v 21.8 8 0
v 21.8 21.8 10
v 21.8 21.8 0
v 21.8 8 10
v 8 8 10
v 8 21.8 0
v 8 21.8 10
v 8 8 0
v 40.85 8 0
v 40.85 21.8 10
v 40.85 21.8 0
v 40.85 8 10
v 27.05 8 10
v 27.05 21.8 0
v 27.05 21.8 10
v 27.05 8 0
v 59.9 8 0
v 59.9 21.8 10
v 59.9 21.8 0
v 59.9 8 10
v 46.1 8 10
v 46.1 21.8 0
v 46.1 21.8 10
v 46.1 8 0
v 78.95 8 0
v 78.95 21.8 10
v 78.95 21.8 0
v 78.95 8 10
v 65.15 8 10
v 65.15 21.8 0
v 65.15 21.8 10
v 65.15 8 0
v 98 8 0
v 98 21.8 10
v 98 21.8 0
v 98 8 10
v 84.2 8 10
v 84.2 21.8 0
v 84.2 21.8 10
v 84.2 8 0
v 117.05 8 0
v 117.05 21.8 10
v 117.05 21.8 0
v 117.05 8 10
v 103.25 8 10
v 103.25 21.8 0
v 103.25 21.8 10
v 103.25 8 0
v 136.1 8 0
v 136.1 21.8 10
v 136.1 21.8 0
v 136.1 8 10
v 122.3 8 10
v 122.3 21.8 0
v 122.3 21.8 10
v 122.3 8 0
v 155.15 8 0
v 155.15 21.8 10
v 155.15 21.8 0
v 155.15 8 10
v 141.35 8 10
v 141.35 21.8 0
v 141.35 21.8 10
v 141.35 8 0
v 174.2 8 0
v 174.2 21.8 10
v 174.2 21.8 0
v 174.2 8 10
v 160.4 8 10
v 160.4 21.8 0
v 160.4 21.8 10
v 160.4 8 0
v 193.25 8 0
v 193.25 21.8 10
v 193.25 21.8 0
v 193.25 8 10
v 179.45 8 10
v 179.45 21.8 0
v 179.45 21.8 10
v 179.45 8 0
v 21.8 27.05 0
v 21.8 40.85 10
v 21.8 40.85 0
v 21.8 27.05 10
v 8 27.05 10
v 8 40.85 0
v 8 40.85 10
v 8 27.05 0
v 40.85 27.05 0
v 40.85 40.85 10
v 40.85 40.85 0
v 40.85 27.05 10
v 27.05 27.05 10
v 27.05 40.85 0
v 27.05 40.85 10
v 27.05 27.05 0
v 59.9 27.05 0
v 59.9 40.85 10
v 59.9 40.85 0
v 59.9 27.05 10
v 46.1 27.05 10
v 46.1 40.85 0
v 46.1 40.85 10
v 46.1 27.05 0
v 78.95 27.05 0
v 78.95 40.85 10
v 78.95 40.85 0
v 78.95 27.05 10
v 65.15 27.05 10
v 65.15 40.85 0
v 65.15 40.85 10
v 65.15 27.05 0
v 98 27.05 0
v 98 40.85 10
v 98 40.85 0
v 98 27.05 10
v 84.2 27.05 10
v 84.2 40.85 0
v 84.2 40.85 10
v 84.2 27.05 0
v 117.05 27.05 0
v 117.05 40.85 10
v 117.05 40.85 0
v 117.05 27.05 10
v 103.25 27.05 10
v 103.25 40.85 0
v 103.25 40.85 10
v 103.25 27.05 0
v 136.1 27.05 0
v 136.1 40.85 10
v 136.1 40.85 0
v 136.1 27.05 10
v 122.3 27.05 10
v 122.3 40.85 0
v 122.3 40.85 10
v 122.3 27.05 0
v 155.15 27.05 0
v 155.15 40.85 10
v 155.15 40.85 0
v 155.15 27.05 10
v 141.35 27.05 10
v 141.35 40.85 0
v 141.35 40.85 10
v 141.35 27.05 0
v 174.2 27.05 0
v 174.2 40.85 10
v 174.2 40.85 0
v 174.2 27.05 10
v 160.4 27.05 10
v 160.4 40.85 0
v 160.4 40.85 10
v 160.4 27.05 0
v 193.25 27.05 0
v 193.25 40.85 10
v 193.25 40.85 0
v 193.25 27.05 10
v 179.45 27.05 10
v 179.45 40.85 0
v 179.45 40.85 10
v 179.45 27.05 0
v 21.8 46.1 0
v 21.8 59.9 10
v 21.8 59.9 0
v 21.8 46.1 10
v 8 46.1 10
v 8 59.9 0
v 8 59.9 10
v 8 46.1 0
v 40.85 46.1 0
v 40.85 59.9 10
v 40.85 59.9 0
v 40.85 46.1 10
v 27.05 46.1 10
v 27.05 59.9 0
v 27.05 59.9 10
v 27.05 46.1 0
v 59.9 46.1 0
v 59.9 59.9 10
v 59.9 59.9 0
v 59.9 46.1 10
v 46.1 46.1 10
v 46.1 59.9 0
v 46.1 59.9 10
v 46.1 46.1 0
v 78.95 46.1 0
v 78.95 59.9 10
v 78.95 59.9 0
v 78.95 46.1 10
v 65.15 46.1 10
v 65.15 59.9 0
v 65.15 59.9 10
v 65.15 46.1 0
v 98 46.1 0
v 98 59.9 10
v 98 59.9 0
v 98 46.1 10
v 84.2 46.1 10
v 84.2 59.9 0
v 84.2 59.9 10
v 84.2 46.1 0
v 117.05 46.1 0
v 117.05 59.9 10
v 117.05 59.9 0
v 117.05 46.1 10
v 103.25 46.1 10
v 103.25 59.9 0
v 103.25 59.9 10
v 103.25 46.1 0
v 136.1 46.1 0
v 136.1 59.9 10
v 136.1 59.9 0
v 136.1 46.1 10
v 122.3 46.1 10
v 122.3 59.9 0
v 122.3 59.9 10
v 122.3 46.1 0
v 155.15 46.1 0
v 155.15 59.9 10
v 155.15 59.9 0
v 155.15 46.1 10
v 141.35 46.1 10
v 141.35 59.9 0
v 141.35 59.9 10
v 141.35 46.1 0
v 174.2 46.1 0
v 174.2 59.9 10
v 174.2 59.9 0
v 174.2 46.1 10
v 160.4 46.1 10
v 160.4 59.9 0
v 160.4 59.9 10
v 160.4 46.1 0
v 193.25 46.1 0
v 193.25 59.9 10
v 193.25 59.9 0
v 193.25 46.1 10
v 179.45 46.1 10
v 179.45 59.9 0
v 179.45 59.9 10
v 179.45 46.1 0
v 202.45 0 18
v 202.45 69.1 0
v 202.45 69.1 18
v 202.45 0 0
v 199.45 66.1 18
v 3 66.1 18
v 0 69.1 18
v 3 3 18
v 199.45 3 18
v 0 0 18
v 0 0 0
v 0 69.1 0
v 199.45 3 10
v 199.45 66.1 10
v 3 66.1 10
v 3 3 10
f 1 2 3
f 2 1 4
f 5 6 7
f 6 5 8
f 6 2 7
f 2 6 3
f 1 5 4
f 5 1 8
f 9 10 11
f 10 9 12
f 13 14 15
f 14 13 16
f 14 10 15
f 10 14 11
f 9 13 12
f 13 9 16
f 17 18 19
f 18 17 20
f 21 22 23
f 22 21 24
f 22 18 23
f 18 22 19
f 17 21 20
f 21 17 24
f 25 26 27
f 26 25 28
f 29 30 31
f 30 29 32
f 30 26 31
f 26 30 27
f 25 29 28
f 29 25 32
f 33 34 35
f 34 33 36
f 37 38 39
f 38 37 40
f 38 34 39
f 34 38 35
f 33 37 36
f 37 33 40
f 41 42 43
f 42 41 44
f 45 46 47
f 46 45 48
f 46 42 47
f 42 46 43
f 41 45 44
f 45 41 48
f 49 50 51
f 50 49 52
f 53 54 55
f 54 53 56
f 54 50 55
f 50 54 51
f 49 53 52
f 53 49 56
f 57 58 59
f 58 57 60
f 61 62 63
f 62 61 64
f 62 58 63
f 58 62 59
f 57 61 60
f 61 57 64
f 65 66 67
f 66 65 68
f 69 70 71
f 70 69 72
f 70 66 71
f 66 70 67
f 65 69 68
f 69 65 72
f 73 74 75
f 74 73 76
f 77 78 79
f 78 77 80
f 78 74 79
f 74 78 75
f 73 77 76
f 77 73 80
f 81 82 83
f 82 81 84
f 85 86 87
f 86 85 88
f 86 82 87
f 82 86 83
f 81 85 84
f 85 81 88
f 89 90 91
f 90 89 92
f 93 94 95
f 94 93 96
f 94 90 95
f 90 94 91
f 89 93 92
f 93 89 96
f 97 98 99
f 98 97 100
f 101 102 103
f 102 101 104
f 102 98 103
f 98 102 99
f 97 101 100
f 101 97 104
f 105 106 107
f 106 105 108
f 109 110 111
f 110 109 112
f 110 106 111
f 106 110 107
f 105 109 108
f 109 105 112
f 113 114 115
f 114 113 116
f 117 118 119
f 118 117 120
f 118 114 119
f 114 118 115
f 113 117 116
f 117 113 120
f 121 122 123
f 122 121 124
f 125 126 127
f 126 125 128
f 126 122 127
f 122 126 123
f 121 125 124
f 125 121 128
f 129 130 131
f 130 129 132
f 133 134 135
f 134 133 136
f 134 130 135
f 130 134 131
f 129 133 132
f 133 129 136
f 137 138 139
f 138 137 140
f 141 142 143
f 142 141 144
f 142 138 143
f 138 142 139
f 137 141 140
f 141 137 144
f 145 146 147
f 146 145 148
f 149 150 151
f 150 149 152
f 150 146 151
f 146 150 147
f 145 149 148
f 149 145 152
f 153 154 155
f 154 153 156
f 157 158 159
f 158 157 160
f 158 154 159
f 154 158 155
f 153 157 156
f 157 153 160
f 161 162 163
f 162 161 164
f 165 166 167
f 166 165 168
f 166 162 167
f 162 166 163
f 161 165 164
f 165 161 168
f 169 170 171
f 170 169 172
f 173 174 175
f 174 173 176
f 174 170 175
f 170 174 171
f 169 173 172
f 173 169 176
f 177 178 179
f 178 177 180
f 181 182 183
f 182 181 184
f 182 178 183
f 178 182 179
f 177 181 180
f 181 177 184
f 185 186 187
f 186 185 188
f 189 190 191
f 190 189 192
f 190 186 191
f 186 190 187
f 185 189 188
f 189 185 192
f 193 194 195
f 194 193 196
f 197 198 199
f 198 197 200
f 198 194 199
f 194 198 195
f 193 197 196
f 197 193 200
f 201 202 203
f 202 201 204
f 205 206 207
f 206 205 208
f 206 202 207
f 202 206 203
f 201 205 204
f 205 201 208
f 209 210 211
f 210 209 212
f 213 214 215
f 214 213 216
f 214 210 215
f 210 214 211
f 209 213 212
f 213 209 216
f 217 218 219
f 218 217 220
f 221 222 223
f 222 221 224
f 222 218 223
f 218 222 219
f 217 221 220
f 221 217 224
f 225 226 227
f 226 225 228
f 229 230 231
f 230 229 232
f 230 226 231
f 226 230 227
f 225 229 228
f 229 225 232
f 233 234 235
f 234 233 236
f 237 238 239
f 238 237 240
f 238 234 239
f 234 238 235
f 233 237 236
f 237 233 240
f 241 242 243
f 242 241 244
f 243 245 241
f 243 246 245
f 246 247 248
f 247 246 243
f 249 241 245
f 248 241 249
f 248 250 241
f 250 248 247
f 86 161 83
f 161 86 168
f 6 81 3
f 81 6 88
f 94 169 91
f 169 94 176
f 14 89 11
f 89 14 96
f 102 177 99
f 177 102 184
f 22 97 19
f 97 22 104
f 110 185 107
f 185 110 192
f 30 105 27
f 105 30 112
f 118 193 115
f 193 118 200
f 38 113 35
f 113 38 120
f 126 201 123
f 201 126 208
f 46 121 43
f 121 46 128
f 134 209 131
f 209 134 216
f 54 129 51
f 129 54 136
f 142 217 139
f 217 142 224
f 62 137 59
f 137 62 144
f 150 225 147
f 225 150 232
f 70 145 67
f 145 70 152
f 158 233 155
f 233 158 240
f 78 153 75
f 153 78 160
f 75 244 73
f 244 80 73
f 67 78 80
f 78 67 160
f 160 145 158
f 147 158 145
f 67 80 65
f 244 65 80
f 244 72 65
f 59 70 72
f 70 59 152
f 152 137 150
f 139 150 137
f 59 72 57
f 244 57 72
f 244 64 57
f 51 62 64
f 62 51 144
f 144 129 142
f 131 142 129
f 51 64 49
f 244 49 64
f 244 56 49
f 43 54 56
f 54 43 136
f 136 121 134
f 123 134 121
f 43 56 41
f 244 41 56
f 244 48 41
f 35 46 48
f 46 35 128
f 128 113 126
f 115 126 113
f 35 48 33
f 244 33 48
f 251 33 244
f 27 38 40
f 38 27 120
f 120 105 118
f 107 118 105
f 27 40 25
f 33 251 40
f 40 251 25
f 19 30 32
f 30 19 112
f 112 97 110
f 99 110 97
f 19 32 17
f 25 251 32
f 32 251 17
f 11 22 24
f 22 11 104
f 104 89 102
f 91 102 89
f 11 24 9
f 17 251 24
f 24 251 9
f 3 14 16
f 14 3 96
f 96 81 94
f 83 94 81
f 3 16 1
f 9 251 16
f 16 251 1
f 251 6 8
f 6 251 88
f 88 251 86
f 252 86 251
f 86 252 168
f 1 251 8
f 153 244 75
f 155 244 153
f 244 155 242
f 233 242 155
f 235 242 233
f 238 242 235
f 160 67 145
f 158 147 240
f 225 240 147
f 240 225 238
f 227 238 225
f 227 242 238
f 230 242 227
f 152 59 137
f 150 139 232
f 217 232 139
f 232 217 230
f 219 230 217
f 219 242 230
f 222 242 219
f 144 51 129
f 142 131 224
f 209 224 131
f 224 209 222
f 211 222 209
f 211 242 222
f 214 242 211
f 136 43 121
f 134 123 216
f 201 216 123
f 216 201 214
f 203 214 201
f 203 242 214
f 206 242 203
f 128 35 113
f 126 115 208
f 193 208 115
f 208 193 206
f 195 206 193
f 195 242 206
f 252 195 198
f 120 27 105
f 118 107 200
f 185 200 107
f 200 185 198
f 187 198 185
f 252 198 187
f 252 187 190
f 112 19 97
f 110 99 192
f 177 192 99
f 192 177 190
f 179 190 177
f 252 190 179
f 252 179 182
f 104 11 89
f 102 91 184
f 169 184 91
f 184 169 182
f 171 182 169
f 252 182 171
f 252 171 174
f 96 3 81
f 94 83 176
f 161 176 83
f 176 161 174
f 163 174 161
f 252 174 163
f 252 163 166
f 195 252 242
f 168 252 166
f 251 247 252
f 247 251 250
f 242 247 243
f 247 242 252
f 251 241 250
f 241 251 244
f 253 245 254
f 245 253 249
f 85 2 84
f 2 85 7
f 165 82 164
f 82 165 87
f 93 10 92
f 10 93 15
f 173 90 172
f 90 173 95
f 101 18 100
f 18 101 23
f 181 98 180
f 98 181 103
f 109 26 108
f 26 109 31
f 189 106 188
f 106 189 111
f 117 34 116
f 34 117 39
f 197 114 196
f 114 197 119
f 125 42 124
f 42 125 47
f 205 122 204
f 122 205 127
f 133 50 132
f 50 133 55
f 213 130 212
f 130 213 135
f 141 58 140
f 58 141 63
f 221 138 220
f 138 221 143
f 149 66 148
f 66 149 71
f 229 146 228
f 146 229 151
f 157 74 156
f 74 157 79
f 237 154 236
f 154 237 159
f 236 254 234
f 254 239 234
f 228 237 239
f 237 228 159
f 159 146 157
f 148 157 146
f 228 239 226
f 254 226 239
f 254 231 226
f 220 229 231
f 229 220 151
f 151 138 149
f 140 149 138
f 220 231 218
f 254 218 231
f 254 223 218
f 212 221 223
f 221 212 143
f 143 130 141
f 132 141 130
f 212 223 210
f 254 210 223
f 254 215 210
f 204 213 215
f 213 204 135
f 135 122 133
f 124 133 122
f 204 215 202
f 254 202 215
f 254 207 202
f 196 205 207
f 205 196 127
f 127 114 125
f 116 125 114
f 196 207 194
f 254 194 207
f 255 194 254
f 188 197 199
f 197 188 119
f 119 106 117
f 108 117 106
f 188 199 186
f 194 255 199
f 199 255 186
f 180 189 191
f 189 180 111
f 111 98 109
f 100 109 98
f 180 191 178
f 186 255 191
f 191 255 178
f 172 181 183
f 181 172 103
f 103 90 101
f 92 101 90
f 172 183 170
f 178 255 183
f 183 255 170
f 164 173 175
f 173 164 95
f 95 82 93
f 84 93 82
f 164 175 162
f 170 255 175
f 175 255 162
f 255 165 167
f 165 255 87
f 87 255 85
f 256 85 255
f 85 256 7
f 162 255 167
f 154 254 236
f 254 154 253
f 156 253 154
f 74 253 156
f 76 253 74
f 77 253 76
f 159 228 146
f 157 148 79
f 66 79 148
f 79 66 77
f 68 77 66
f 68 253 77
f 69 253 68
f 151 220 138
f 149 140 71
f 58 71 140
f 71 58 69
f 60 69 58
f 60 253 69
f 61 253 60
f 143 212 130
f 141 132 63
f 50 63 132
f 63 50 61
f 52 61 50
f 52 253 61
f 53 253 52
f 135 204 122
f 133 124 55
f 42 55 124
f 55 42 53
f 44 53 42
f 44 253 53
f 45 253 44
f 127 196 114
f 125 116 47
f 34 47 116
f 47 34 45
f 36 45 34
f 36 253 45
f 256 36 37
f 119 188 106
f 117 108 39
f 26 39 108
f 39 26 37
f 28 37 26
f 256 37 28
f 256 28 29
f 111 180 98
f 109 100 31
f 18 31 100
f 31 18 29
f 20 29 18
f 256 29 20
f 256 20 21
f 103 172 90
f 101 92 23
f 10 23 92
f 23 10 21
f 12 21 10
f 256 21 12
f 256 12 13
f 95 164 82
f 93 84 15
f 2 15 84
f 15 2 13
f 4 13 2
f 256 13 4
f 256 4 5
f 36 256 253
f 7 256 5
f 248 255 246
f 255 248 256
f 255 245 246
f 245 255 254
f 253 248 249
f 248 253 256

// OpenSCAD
// Generated keyboard case
// Layout: 3x10
// Switch type: Kailh Choc

// Parameters
case_width = 202.45;
case_height = 69.10;
case_depth = 18.00;
wall_thickness = 3.00;
base_height = 10.00;
switch_cutout_size = 13.80;
key_spacing = 19.05;

module keyboard_case() {
    difference() {
        // Outer shell
        translate([0, 0, 0])
            cube([case_width, case_height, case_depth]);

        // Inner cavity
        translate([wall_thickness, wall_thickness, base_height])
            cube([case_width - 2*wall_thickness, 
                  case_height - 2*wall_thickness, 
                  case_depth - base_height + 1]);

        // Switch cutouts
        translate([wall_thickness + 5 - 0.00, wall_thickness + 5 - 0.00, -1])
            switch_plate();
    }
}

module switch_plate() {
    translate([0.00, 0.00, 0])
        cube([switch_cutout_size, switch_cutout_size, base_height + 2]);
    translate([19.05, 0.00, 0])
        cube([switch_cutout_size, switch_cutout_size, base_height + 2]);
    translate([38.10, 0.00, 0])
        cube([switch_cutout_size, switch_cutout_size, base_height + 2]);
    translate([57.15, 0.00, 0])
        cube([switch_cutout_size, switch_cutout_size, base_height + 2]);
    translate([76.20, 0.00, 0])
        cube([switch_cutout_size, switch_cutout_size, base_height + 2]);
    translate([95.25, 0.00, 0])
        cube([switch_cutout_size, switch_cutout_size, base_height + 2]);
    translate([114.30, 0.00, 0])
        cube([switch_cutout_size, switch_cutout_size, base_height + 2]);
    translate([133.35, 0.00, 0])
        cube([switch_cutout_size, switch_cutout_size, base_height + 2]);
    translate([152.40, 0.00, 0])
        cube([switch_cutout_size, switch_cutout_size, base_height + 2]);
    translate([171.45, 0.00, 0])
        cube([switch_cutout_size, switch_cutout_size, base_height + 2]);
    translate([0.00, 19.05, 0])
        cube([switch_cutout_size, switch_cutout_size, base_height + 2]);
    translate([19.05, 19.05, 0])
        cube([switch_cutout_size, switch_cutout_size, base_height + 2]);
    translate([38.10, 19.05, 0])
        cube([switch_cutout_size, switch_cutout_size, base_height + 2]);
    translate([57.15, 19.05, 0])
        cube([switch_cutout_size, switch_cutout_size, base_height + 2]);
    translate([76.20, 19.05, 0])
        cube([switch_cutout_size, switch_cutout_size, base_height + 2]);
    translate([95.25, 19.05, 0])
        cube([switch_cutout_size, switch_cutout_size, base_height + 2]);
    translate([114.30, 19.05, 0])
        cube([switch_cutout_size, switch_cutout_size, base_height + 2]);
    translate([133.35, 19.05, 0])
        cube([switch_cutout_size, switch_cutout_size, base_height + 2]);
    translate([152.40, 19.05, 0])
        cube([switch_cutout_size, switch_cutout_size, base_height + 2]);
    translate([171.45, 19.05, 0])
        cube([switch_cutout_size, switch_cutout_size, base_height + 2]);
    translate([0.00, 38.10, 0])
        cube([switch_cutout_size, switch_cutout_size, base_height + 2]);
    translate([19.05, 38.10, 0])
        cube([switch_cutout_size, switch_cutout_size, base_height + 2]);
    translate([38.10, 38.10, 0])
        cube([switch_cutout_size, switch_cutout_size, base_height + 2]);
    translate([57.15, 38.10, 0])
        cube([switch_cutout_size, switch_cutout_size, base_height + 2]);
    translate([76.20, 38.10, 0])
        cube([switch_cutout_size, switch_cutout_size, base_height + 2]);
    translate([95.25, 38.10, 0])
        cube([switch_cutout_size, switch_cutout_size, base_height + 2]);
    translate([114.30, 38.10, 0])
        cube([switch_cutout_size, switch_cutout_size, base_height + 2]);
    translate([133.35, 38.10, 0])
        cube([switch_cutout_size, switch_cutout_size, base_height + 2]);
    translate([152.40, 38.10, 0])
        cube([switch_cutout_size, switch_cutout_size, base_height + 2]);
    translate([171.45, 38.10, 0])
        cube([switch_cutout_size, switch_cutout_size, base_height + 2]);
}

// Generate the case
keyboard_case();
